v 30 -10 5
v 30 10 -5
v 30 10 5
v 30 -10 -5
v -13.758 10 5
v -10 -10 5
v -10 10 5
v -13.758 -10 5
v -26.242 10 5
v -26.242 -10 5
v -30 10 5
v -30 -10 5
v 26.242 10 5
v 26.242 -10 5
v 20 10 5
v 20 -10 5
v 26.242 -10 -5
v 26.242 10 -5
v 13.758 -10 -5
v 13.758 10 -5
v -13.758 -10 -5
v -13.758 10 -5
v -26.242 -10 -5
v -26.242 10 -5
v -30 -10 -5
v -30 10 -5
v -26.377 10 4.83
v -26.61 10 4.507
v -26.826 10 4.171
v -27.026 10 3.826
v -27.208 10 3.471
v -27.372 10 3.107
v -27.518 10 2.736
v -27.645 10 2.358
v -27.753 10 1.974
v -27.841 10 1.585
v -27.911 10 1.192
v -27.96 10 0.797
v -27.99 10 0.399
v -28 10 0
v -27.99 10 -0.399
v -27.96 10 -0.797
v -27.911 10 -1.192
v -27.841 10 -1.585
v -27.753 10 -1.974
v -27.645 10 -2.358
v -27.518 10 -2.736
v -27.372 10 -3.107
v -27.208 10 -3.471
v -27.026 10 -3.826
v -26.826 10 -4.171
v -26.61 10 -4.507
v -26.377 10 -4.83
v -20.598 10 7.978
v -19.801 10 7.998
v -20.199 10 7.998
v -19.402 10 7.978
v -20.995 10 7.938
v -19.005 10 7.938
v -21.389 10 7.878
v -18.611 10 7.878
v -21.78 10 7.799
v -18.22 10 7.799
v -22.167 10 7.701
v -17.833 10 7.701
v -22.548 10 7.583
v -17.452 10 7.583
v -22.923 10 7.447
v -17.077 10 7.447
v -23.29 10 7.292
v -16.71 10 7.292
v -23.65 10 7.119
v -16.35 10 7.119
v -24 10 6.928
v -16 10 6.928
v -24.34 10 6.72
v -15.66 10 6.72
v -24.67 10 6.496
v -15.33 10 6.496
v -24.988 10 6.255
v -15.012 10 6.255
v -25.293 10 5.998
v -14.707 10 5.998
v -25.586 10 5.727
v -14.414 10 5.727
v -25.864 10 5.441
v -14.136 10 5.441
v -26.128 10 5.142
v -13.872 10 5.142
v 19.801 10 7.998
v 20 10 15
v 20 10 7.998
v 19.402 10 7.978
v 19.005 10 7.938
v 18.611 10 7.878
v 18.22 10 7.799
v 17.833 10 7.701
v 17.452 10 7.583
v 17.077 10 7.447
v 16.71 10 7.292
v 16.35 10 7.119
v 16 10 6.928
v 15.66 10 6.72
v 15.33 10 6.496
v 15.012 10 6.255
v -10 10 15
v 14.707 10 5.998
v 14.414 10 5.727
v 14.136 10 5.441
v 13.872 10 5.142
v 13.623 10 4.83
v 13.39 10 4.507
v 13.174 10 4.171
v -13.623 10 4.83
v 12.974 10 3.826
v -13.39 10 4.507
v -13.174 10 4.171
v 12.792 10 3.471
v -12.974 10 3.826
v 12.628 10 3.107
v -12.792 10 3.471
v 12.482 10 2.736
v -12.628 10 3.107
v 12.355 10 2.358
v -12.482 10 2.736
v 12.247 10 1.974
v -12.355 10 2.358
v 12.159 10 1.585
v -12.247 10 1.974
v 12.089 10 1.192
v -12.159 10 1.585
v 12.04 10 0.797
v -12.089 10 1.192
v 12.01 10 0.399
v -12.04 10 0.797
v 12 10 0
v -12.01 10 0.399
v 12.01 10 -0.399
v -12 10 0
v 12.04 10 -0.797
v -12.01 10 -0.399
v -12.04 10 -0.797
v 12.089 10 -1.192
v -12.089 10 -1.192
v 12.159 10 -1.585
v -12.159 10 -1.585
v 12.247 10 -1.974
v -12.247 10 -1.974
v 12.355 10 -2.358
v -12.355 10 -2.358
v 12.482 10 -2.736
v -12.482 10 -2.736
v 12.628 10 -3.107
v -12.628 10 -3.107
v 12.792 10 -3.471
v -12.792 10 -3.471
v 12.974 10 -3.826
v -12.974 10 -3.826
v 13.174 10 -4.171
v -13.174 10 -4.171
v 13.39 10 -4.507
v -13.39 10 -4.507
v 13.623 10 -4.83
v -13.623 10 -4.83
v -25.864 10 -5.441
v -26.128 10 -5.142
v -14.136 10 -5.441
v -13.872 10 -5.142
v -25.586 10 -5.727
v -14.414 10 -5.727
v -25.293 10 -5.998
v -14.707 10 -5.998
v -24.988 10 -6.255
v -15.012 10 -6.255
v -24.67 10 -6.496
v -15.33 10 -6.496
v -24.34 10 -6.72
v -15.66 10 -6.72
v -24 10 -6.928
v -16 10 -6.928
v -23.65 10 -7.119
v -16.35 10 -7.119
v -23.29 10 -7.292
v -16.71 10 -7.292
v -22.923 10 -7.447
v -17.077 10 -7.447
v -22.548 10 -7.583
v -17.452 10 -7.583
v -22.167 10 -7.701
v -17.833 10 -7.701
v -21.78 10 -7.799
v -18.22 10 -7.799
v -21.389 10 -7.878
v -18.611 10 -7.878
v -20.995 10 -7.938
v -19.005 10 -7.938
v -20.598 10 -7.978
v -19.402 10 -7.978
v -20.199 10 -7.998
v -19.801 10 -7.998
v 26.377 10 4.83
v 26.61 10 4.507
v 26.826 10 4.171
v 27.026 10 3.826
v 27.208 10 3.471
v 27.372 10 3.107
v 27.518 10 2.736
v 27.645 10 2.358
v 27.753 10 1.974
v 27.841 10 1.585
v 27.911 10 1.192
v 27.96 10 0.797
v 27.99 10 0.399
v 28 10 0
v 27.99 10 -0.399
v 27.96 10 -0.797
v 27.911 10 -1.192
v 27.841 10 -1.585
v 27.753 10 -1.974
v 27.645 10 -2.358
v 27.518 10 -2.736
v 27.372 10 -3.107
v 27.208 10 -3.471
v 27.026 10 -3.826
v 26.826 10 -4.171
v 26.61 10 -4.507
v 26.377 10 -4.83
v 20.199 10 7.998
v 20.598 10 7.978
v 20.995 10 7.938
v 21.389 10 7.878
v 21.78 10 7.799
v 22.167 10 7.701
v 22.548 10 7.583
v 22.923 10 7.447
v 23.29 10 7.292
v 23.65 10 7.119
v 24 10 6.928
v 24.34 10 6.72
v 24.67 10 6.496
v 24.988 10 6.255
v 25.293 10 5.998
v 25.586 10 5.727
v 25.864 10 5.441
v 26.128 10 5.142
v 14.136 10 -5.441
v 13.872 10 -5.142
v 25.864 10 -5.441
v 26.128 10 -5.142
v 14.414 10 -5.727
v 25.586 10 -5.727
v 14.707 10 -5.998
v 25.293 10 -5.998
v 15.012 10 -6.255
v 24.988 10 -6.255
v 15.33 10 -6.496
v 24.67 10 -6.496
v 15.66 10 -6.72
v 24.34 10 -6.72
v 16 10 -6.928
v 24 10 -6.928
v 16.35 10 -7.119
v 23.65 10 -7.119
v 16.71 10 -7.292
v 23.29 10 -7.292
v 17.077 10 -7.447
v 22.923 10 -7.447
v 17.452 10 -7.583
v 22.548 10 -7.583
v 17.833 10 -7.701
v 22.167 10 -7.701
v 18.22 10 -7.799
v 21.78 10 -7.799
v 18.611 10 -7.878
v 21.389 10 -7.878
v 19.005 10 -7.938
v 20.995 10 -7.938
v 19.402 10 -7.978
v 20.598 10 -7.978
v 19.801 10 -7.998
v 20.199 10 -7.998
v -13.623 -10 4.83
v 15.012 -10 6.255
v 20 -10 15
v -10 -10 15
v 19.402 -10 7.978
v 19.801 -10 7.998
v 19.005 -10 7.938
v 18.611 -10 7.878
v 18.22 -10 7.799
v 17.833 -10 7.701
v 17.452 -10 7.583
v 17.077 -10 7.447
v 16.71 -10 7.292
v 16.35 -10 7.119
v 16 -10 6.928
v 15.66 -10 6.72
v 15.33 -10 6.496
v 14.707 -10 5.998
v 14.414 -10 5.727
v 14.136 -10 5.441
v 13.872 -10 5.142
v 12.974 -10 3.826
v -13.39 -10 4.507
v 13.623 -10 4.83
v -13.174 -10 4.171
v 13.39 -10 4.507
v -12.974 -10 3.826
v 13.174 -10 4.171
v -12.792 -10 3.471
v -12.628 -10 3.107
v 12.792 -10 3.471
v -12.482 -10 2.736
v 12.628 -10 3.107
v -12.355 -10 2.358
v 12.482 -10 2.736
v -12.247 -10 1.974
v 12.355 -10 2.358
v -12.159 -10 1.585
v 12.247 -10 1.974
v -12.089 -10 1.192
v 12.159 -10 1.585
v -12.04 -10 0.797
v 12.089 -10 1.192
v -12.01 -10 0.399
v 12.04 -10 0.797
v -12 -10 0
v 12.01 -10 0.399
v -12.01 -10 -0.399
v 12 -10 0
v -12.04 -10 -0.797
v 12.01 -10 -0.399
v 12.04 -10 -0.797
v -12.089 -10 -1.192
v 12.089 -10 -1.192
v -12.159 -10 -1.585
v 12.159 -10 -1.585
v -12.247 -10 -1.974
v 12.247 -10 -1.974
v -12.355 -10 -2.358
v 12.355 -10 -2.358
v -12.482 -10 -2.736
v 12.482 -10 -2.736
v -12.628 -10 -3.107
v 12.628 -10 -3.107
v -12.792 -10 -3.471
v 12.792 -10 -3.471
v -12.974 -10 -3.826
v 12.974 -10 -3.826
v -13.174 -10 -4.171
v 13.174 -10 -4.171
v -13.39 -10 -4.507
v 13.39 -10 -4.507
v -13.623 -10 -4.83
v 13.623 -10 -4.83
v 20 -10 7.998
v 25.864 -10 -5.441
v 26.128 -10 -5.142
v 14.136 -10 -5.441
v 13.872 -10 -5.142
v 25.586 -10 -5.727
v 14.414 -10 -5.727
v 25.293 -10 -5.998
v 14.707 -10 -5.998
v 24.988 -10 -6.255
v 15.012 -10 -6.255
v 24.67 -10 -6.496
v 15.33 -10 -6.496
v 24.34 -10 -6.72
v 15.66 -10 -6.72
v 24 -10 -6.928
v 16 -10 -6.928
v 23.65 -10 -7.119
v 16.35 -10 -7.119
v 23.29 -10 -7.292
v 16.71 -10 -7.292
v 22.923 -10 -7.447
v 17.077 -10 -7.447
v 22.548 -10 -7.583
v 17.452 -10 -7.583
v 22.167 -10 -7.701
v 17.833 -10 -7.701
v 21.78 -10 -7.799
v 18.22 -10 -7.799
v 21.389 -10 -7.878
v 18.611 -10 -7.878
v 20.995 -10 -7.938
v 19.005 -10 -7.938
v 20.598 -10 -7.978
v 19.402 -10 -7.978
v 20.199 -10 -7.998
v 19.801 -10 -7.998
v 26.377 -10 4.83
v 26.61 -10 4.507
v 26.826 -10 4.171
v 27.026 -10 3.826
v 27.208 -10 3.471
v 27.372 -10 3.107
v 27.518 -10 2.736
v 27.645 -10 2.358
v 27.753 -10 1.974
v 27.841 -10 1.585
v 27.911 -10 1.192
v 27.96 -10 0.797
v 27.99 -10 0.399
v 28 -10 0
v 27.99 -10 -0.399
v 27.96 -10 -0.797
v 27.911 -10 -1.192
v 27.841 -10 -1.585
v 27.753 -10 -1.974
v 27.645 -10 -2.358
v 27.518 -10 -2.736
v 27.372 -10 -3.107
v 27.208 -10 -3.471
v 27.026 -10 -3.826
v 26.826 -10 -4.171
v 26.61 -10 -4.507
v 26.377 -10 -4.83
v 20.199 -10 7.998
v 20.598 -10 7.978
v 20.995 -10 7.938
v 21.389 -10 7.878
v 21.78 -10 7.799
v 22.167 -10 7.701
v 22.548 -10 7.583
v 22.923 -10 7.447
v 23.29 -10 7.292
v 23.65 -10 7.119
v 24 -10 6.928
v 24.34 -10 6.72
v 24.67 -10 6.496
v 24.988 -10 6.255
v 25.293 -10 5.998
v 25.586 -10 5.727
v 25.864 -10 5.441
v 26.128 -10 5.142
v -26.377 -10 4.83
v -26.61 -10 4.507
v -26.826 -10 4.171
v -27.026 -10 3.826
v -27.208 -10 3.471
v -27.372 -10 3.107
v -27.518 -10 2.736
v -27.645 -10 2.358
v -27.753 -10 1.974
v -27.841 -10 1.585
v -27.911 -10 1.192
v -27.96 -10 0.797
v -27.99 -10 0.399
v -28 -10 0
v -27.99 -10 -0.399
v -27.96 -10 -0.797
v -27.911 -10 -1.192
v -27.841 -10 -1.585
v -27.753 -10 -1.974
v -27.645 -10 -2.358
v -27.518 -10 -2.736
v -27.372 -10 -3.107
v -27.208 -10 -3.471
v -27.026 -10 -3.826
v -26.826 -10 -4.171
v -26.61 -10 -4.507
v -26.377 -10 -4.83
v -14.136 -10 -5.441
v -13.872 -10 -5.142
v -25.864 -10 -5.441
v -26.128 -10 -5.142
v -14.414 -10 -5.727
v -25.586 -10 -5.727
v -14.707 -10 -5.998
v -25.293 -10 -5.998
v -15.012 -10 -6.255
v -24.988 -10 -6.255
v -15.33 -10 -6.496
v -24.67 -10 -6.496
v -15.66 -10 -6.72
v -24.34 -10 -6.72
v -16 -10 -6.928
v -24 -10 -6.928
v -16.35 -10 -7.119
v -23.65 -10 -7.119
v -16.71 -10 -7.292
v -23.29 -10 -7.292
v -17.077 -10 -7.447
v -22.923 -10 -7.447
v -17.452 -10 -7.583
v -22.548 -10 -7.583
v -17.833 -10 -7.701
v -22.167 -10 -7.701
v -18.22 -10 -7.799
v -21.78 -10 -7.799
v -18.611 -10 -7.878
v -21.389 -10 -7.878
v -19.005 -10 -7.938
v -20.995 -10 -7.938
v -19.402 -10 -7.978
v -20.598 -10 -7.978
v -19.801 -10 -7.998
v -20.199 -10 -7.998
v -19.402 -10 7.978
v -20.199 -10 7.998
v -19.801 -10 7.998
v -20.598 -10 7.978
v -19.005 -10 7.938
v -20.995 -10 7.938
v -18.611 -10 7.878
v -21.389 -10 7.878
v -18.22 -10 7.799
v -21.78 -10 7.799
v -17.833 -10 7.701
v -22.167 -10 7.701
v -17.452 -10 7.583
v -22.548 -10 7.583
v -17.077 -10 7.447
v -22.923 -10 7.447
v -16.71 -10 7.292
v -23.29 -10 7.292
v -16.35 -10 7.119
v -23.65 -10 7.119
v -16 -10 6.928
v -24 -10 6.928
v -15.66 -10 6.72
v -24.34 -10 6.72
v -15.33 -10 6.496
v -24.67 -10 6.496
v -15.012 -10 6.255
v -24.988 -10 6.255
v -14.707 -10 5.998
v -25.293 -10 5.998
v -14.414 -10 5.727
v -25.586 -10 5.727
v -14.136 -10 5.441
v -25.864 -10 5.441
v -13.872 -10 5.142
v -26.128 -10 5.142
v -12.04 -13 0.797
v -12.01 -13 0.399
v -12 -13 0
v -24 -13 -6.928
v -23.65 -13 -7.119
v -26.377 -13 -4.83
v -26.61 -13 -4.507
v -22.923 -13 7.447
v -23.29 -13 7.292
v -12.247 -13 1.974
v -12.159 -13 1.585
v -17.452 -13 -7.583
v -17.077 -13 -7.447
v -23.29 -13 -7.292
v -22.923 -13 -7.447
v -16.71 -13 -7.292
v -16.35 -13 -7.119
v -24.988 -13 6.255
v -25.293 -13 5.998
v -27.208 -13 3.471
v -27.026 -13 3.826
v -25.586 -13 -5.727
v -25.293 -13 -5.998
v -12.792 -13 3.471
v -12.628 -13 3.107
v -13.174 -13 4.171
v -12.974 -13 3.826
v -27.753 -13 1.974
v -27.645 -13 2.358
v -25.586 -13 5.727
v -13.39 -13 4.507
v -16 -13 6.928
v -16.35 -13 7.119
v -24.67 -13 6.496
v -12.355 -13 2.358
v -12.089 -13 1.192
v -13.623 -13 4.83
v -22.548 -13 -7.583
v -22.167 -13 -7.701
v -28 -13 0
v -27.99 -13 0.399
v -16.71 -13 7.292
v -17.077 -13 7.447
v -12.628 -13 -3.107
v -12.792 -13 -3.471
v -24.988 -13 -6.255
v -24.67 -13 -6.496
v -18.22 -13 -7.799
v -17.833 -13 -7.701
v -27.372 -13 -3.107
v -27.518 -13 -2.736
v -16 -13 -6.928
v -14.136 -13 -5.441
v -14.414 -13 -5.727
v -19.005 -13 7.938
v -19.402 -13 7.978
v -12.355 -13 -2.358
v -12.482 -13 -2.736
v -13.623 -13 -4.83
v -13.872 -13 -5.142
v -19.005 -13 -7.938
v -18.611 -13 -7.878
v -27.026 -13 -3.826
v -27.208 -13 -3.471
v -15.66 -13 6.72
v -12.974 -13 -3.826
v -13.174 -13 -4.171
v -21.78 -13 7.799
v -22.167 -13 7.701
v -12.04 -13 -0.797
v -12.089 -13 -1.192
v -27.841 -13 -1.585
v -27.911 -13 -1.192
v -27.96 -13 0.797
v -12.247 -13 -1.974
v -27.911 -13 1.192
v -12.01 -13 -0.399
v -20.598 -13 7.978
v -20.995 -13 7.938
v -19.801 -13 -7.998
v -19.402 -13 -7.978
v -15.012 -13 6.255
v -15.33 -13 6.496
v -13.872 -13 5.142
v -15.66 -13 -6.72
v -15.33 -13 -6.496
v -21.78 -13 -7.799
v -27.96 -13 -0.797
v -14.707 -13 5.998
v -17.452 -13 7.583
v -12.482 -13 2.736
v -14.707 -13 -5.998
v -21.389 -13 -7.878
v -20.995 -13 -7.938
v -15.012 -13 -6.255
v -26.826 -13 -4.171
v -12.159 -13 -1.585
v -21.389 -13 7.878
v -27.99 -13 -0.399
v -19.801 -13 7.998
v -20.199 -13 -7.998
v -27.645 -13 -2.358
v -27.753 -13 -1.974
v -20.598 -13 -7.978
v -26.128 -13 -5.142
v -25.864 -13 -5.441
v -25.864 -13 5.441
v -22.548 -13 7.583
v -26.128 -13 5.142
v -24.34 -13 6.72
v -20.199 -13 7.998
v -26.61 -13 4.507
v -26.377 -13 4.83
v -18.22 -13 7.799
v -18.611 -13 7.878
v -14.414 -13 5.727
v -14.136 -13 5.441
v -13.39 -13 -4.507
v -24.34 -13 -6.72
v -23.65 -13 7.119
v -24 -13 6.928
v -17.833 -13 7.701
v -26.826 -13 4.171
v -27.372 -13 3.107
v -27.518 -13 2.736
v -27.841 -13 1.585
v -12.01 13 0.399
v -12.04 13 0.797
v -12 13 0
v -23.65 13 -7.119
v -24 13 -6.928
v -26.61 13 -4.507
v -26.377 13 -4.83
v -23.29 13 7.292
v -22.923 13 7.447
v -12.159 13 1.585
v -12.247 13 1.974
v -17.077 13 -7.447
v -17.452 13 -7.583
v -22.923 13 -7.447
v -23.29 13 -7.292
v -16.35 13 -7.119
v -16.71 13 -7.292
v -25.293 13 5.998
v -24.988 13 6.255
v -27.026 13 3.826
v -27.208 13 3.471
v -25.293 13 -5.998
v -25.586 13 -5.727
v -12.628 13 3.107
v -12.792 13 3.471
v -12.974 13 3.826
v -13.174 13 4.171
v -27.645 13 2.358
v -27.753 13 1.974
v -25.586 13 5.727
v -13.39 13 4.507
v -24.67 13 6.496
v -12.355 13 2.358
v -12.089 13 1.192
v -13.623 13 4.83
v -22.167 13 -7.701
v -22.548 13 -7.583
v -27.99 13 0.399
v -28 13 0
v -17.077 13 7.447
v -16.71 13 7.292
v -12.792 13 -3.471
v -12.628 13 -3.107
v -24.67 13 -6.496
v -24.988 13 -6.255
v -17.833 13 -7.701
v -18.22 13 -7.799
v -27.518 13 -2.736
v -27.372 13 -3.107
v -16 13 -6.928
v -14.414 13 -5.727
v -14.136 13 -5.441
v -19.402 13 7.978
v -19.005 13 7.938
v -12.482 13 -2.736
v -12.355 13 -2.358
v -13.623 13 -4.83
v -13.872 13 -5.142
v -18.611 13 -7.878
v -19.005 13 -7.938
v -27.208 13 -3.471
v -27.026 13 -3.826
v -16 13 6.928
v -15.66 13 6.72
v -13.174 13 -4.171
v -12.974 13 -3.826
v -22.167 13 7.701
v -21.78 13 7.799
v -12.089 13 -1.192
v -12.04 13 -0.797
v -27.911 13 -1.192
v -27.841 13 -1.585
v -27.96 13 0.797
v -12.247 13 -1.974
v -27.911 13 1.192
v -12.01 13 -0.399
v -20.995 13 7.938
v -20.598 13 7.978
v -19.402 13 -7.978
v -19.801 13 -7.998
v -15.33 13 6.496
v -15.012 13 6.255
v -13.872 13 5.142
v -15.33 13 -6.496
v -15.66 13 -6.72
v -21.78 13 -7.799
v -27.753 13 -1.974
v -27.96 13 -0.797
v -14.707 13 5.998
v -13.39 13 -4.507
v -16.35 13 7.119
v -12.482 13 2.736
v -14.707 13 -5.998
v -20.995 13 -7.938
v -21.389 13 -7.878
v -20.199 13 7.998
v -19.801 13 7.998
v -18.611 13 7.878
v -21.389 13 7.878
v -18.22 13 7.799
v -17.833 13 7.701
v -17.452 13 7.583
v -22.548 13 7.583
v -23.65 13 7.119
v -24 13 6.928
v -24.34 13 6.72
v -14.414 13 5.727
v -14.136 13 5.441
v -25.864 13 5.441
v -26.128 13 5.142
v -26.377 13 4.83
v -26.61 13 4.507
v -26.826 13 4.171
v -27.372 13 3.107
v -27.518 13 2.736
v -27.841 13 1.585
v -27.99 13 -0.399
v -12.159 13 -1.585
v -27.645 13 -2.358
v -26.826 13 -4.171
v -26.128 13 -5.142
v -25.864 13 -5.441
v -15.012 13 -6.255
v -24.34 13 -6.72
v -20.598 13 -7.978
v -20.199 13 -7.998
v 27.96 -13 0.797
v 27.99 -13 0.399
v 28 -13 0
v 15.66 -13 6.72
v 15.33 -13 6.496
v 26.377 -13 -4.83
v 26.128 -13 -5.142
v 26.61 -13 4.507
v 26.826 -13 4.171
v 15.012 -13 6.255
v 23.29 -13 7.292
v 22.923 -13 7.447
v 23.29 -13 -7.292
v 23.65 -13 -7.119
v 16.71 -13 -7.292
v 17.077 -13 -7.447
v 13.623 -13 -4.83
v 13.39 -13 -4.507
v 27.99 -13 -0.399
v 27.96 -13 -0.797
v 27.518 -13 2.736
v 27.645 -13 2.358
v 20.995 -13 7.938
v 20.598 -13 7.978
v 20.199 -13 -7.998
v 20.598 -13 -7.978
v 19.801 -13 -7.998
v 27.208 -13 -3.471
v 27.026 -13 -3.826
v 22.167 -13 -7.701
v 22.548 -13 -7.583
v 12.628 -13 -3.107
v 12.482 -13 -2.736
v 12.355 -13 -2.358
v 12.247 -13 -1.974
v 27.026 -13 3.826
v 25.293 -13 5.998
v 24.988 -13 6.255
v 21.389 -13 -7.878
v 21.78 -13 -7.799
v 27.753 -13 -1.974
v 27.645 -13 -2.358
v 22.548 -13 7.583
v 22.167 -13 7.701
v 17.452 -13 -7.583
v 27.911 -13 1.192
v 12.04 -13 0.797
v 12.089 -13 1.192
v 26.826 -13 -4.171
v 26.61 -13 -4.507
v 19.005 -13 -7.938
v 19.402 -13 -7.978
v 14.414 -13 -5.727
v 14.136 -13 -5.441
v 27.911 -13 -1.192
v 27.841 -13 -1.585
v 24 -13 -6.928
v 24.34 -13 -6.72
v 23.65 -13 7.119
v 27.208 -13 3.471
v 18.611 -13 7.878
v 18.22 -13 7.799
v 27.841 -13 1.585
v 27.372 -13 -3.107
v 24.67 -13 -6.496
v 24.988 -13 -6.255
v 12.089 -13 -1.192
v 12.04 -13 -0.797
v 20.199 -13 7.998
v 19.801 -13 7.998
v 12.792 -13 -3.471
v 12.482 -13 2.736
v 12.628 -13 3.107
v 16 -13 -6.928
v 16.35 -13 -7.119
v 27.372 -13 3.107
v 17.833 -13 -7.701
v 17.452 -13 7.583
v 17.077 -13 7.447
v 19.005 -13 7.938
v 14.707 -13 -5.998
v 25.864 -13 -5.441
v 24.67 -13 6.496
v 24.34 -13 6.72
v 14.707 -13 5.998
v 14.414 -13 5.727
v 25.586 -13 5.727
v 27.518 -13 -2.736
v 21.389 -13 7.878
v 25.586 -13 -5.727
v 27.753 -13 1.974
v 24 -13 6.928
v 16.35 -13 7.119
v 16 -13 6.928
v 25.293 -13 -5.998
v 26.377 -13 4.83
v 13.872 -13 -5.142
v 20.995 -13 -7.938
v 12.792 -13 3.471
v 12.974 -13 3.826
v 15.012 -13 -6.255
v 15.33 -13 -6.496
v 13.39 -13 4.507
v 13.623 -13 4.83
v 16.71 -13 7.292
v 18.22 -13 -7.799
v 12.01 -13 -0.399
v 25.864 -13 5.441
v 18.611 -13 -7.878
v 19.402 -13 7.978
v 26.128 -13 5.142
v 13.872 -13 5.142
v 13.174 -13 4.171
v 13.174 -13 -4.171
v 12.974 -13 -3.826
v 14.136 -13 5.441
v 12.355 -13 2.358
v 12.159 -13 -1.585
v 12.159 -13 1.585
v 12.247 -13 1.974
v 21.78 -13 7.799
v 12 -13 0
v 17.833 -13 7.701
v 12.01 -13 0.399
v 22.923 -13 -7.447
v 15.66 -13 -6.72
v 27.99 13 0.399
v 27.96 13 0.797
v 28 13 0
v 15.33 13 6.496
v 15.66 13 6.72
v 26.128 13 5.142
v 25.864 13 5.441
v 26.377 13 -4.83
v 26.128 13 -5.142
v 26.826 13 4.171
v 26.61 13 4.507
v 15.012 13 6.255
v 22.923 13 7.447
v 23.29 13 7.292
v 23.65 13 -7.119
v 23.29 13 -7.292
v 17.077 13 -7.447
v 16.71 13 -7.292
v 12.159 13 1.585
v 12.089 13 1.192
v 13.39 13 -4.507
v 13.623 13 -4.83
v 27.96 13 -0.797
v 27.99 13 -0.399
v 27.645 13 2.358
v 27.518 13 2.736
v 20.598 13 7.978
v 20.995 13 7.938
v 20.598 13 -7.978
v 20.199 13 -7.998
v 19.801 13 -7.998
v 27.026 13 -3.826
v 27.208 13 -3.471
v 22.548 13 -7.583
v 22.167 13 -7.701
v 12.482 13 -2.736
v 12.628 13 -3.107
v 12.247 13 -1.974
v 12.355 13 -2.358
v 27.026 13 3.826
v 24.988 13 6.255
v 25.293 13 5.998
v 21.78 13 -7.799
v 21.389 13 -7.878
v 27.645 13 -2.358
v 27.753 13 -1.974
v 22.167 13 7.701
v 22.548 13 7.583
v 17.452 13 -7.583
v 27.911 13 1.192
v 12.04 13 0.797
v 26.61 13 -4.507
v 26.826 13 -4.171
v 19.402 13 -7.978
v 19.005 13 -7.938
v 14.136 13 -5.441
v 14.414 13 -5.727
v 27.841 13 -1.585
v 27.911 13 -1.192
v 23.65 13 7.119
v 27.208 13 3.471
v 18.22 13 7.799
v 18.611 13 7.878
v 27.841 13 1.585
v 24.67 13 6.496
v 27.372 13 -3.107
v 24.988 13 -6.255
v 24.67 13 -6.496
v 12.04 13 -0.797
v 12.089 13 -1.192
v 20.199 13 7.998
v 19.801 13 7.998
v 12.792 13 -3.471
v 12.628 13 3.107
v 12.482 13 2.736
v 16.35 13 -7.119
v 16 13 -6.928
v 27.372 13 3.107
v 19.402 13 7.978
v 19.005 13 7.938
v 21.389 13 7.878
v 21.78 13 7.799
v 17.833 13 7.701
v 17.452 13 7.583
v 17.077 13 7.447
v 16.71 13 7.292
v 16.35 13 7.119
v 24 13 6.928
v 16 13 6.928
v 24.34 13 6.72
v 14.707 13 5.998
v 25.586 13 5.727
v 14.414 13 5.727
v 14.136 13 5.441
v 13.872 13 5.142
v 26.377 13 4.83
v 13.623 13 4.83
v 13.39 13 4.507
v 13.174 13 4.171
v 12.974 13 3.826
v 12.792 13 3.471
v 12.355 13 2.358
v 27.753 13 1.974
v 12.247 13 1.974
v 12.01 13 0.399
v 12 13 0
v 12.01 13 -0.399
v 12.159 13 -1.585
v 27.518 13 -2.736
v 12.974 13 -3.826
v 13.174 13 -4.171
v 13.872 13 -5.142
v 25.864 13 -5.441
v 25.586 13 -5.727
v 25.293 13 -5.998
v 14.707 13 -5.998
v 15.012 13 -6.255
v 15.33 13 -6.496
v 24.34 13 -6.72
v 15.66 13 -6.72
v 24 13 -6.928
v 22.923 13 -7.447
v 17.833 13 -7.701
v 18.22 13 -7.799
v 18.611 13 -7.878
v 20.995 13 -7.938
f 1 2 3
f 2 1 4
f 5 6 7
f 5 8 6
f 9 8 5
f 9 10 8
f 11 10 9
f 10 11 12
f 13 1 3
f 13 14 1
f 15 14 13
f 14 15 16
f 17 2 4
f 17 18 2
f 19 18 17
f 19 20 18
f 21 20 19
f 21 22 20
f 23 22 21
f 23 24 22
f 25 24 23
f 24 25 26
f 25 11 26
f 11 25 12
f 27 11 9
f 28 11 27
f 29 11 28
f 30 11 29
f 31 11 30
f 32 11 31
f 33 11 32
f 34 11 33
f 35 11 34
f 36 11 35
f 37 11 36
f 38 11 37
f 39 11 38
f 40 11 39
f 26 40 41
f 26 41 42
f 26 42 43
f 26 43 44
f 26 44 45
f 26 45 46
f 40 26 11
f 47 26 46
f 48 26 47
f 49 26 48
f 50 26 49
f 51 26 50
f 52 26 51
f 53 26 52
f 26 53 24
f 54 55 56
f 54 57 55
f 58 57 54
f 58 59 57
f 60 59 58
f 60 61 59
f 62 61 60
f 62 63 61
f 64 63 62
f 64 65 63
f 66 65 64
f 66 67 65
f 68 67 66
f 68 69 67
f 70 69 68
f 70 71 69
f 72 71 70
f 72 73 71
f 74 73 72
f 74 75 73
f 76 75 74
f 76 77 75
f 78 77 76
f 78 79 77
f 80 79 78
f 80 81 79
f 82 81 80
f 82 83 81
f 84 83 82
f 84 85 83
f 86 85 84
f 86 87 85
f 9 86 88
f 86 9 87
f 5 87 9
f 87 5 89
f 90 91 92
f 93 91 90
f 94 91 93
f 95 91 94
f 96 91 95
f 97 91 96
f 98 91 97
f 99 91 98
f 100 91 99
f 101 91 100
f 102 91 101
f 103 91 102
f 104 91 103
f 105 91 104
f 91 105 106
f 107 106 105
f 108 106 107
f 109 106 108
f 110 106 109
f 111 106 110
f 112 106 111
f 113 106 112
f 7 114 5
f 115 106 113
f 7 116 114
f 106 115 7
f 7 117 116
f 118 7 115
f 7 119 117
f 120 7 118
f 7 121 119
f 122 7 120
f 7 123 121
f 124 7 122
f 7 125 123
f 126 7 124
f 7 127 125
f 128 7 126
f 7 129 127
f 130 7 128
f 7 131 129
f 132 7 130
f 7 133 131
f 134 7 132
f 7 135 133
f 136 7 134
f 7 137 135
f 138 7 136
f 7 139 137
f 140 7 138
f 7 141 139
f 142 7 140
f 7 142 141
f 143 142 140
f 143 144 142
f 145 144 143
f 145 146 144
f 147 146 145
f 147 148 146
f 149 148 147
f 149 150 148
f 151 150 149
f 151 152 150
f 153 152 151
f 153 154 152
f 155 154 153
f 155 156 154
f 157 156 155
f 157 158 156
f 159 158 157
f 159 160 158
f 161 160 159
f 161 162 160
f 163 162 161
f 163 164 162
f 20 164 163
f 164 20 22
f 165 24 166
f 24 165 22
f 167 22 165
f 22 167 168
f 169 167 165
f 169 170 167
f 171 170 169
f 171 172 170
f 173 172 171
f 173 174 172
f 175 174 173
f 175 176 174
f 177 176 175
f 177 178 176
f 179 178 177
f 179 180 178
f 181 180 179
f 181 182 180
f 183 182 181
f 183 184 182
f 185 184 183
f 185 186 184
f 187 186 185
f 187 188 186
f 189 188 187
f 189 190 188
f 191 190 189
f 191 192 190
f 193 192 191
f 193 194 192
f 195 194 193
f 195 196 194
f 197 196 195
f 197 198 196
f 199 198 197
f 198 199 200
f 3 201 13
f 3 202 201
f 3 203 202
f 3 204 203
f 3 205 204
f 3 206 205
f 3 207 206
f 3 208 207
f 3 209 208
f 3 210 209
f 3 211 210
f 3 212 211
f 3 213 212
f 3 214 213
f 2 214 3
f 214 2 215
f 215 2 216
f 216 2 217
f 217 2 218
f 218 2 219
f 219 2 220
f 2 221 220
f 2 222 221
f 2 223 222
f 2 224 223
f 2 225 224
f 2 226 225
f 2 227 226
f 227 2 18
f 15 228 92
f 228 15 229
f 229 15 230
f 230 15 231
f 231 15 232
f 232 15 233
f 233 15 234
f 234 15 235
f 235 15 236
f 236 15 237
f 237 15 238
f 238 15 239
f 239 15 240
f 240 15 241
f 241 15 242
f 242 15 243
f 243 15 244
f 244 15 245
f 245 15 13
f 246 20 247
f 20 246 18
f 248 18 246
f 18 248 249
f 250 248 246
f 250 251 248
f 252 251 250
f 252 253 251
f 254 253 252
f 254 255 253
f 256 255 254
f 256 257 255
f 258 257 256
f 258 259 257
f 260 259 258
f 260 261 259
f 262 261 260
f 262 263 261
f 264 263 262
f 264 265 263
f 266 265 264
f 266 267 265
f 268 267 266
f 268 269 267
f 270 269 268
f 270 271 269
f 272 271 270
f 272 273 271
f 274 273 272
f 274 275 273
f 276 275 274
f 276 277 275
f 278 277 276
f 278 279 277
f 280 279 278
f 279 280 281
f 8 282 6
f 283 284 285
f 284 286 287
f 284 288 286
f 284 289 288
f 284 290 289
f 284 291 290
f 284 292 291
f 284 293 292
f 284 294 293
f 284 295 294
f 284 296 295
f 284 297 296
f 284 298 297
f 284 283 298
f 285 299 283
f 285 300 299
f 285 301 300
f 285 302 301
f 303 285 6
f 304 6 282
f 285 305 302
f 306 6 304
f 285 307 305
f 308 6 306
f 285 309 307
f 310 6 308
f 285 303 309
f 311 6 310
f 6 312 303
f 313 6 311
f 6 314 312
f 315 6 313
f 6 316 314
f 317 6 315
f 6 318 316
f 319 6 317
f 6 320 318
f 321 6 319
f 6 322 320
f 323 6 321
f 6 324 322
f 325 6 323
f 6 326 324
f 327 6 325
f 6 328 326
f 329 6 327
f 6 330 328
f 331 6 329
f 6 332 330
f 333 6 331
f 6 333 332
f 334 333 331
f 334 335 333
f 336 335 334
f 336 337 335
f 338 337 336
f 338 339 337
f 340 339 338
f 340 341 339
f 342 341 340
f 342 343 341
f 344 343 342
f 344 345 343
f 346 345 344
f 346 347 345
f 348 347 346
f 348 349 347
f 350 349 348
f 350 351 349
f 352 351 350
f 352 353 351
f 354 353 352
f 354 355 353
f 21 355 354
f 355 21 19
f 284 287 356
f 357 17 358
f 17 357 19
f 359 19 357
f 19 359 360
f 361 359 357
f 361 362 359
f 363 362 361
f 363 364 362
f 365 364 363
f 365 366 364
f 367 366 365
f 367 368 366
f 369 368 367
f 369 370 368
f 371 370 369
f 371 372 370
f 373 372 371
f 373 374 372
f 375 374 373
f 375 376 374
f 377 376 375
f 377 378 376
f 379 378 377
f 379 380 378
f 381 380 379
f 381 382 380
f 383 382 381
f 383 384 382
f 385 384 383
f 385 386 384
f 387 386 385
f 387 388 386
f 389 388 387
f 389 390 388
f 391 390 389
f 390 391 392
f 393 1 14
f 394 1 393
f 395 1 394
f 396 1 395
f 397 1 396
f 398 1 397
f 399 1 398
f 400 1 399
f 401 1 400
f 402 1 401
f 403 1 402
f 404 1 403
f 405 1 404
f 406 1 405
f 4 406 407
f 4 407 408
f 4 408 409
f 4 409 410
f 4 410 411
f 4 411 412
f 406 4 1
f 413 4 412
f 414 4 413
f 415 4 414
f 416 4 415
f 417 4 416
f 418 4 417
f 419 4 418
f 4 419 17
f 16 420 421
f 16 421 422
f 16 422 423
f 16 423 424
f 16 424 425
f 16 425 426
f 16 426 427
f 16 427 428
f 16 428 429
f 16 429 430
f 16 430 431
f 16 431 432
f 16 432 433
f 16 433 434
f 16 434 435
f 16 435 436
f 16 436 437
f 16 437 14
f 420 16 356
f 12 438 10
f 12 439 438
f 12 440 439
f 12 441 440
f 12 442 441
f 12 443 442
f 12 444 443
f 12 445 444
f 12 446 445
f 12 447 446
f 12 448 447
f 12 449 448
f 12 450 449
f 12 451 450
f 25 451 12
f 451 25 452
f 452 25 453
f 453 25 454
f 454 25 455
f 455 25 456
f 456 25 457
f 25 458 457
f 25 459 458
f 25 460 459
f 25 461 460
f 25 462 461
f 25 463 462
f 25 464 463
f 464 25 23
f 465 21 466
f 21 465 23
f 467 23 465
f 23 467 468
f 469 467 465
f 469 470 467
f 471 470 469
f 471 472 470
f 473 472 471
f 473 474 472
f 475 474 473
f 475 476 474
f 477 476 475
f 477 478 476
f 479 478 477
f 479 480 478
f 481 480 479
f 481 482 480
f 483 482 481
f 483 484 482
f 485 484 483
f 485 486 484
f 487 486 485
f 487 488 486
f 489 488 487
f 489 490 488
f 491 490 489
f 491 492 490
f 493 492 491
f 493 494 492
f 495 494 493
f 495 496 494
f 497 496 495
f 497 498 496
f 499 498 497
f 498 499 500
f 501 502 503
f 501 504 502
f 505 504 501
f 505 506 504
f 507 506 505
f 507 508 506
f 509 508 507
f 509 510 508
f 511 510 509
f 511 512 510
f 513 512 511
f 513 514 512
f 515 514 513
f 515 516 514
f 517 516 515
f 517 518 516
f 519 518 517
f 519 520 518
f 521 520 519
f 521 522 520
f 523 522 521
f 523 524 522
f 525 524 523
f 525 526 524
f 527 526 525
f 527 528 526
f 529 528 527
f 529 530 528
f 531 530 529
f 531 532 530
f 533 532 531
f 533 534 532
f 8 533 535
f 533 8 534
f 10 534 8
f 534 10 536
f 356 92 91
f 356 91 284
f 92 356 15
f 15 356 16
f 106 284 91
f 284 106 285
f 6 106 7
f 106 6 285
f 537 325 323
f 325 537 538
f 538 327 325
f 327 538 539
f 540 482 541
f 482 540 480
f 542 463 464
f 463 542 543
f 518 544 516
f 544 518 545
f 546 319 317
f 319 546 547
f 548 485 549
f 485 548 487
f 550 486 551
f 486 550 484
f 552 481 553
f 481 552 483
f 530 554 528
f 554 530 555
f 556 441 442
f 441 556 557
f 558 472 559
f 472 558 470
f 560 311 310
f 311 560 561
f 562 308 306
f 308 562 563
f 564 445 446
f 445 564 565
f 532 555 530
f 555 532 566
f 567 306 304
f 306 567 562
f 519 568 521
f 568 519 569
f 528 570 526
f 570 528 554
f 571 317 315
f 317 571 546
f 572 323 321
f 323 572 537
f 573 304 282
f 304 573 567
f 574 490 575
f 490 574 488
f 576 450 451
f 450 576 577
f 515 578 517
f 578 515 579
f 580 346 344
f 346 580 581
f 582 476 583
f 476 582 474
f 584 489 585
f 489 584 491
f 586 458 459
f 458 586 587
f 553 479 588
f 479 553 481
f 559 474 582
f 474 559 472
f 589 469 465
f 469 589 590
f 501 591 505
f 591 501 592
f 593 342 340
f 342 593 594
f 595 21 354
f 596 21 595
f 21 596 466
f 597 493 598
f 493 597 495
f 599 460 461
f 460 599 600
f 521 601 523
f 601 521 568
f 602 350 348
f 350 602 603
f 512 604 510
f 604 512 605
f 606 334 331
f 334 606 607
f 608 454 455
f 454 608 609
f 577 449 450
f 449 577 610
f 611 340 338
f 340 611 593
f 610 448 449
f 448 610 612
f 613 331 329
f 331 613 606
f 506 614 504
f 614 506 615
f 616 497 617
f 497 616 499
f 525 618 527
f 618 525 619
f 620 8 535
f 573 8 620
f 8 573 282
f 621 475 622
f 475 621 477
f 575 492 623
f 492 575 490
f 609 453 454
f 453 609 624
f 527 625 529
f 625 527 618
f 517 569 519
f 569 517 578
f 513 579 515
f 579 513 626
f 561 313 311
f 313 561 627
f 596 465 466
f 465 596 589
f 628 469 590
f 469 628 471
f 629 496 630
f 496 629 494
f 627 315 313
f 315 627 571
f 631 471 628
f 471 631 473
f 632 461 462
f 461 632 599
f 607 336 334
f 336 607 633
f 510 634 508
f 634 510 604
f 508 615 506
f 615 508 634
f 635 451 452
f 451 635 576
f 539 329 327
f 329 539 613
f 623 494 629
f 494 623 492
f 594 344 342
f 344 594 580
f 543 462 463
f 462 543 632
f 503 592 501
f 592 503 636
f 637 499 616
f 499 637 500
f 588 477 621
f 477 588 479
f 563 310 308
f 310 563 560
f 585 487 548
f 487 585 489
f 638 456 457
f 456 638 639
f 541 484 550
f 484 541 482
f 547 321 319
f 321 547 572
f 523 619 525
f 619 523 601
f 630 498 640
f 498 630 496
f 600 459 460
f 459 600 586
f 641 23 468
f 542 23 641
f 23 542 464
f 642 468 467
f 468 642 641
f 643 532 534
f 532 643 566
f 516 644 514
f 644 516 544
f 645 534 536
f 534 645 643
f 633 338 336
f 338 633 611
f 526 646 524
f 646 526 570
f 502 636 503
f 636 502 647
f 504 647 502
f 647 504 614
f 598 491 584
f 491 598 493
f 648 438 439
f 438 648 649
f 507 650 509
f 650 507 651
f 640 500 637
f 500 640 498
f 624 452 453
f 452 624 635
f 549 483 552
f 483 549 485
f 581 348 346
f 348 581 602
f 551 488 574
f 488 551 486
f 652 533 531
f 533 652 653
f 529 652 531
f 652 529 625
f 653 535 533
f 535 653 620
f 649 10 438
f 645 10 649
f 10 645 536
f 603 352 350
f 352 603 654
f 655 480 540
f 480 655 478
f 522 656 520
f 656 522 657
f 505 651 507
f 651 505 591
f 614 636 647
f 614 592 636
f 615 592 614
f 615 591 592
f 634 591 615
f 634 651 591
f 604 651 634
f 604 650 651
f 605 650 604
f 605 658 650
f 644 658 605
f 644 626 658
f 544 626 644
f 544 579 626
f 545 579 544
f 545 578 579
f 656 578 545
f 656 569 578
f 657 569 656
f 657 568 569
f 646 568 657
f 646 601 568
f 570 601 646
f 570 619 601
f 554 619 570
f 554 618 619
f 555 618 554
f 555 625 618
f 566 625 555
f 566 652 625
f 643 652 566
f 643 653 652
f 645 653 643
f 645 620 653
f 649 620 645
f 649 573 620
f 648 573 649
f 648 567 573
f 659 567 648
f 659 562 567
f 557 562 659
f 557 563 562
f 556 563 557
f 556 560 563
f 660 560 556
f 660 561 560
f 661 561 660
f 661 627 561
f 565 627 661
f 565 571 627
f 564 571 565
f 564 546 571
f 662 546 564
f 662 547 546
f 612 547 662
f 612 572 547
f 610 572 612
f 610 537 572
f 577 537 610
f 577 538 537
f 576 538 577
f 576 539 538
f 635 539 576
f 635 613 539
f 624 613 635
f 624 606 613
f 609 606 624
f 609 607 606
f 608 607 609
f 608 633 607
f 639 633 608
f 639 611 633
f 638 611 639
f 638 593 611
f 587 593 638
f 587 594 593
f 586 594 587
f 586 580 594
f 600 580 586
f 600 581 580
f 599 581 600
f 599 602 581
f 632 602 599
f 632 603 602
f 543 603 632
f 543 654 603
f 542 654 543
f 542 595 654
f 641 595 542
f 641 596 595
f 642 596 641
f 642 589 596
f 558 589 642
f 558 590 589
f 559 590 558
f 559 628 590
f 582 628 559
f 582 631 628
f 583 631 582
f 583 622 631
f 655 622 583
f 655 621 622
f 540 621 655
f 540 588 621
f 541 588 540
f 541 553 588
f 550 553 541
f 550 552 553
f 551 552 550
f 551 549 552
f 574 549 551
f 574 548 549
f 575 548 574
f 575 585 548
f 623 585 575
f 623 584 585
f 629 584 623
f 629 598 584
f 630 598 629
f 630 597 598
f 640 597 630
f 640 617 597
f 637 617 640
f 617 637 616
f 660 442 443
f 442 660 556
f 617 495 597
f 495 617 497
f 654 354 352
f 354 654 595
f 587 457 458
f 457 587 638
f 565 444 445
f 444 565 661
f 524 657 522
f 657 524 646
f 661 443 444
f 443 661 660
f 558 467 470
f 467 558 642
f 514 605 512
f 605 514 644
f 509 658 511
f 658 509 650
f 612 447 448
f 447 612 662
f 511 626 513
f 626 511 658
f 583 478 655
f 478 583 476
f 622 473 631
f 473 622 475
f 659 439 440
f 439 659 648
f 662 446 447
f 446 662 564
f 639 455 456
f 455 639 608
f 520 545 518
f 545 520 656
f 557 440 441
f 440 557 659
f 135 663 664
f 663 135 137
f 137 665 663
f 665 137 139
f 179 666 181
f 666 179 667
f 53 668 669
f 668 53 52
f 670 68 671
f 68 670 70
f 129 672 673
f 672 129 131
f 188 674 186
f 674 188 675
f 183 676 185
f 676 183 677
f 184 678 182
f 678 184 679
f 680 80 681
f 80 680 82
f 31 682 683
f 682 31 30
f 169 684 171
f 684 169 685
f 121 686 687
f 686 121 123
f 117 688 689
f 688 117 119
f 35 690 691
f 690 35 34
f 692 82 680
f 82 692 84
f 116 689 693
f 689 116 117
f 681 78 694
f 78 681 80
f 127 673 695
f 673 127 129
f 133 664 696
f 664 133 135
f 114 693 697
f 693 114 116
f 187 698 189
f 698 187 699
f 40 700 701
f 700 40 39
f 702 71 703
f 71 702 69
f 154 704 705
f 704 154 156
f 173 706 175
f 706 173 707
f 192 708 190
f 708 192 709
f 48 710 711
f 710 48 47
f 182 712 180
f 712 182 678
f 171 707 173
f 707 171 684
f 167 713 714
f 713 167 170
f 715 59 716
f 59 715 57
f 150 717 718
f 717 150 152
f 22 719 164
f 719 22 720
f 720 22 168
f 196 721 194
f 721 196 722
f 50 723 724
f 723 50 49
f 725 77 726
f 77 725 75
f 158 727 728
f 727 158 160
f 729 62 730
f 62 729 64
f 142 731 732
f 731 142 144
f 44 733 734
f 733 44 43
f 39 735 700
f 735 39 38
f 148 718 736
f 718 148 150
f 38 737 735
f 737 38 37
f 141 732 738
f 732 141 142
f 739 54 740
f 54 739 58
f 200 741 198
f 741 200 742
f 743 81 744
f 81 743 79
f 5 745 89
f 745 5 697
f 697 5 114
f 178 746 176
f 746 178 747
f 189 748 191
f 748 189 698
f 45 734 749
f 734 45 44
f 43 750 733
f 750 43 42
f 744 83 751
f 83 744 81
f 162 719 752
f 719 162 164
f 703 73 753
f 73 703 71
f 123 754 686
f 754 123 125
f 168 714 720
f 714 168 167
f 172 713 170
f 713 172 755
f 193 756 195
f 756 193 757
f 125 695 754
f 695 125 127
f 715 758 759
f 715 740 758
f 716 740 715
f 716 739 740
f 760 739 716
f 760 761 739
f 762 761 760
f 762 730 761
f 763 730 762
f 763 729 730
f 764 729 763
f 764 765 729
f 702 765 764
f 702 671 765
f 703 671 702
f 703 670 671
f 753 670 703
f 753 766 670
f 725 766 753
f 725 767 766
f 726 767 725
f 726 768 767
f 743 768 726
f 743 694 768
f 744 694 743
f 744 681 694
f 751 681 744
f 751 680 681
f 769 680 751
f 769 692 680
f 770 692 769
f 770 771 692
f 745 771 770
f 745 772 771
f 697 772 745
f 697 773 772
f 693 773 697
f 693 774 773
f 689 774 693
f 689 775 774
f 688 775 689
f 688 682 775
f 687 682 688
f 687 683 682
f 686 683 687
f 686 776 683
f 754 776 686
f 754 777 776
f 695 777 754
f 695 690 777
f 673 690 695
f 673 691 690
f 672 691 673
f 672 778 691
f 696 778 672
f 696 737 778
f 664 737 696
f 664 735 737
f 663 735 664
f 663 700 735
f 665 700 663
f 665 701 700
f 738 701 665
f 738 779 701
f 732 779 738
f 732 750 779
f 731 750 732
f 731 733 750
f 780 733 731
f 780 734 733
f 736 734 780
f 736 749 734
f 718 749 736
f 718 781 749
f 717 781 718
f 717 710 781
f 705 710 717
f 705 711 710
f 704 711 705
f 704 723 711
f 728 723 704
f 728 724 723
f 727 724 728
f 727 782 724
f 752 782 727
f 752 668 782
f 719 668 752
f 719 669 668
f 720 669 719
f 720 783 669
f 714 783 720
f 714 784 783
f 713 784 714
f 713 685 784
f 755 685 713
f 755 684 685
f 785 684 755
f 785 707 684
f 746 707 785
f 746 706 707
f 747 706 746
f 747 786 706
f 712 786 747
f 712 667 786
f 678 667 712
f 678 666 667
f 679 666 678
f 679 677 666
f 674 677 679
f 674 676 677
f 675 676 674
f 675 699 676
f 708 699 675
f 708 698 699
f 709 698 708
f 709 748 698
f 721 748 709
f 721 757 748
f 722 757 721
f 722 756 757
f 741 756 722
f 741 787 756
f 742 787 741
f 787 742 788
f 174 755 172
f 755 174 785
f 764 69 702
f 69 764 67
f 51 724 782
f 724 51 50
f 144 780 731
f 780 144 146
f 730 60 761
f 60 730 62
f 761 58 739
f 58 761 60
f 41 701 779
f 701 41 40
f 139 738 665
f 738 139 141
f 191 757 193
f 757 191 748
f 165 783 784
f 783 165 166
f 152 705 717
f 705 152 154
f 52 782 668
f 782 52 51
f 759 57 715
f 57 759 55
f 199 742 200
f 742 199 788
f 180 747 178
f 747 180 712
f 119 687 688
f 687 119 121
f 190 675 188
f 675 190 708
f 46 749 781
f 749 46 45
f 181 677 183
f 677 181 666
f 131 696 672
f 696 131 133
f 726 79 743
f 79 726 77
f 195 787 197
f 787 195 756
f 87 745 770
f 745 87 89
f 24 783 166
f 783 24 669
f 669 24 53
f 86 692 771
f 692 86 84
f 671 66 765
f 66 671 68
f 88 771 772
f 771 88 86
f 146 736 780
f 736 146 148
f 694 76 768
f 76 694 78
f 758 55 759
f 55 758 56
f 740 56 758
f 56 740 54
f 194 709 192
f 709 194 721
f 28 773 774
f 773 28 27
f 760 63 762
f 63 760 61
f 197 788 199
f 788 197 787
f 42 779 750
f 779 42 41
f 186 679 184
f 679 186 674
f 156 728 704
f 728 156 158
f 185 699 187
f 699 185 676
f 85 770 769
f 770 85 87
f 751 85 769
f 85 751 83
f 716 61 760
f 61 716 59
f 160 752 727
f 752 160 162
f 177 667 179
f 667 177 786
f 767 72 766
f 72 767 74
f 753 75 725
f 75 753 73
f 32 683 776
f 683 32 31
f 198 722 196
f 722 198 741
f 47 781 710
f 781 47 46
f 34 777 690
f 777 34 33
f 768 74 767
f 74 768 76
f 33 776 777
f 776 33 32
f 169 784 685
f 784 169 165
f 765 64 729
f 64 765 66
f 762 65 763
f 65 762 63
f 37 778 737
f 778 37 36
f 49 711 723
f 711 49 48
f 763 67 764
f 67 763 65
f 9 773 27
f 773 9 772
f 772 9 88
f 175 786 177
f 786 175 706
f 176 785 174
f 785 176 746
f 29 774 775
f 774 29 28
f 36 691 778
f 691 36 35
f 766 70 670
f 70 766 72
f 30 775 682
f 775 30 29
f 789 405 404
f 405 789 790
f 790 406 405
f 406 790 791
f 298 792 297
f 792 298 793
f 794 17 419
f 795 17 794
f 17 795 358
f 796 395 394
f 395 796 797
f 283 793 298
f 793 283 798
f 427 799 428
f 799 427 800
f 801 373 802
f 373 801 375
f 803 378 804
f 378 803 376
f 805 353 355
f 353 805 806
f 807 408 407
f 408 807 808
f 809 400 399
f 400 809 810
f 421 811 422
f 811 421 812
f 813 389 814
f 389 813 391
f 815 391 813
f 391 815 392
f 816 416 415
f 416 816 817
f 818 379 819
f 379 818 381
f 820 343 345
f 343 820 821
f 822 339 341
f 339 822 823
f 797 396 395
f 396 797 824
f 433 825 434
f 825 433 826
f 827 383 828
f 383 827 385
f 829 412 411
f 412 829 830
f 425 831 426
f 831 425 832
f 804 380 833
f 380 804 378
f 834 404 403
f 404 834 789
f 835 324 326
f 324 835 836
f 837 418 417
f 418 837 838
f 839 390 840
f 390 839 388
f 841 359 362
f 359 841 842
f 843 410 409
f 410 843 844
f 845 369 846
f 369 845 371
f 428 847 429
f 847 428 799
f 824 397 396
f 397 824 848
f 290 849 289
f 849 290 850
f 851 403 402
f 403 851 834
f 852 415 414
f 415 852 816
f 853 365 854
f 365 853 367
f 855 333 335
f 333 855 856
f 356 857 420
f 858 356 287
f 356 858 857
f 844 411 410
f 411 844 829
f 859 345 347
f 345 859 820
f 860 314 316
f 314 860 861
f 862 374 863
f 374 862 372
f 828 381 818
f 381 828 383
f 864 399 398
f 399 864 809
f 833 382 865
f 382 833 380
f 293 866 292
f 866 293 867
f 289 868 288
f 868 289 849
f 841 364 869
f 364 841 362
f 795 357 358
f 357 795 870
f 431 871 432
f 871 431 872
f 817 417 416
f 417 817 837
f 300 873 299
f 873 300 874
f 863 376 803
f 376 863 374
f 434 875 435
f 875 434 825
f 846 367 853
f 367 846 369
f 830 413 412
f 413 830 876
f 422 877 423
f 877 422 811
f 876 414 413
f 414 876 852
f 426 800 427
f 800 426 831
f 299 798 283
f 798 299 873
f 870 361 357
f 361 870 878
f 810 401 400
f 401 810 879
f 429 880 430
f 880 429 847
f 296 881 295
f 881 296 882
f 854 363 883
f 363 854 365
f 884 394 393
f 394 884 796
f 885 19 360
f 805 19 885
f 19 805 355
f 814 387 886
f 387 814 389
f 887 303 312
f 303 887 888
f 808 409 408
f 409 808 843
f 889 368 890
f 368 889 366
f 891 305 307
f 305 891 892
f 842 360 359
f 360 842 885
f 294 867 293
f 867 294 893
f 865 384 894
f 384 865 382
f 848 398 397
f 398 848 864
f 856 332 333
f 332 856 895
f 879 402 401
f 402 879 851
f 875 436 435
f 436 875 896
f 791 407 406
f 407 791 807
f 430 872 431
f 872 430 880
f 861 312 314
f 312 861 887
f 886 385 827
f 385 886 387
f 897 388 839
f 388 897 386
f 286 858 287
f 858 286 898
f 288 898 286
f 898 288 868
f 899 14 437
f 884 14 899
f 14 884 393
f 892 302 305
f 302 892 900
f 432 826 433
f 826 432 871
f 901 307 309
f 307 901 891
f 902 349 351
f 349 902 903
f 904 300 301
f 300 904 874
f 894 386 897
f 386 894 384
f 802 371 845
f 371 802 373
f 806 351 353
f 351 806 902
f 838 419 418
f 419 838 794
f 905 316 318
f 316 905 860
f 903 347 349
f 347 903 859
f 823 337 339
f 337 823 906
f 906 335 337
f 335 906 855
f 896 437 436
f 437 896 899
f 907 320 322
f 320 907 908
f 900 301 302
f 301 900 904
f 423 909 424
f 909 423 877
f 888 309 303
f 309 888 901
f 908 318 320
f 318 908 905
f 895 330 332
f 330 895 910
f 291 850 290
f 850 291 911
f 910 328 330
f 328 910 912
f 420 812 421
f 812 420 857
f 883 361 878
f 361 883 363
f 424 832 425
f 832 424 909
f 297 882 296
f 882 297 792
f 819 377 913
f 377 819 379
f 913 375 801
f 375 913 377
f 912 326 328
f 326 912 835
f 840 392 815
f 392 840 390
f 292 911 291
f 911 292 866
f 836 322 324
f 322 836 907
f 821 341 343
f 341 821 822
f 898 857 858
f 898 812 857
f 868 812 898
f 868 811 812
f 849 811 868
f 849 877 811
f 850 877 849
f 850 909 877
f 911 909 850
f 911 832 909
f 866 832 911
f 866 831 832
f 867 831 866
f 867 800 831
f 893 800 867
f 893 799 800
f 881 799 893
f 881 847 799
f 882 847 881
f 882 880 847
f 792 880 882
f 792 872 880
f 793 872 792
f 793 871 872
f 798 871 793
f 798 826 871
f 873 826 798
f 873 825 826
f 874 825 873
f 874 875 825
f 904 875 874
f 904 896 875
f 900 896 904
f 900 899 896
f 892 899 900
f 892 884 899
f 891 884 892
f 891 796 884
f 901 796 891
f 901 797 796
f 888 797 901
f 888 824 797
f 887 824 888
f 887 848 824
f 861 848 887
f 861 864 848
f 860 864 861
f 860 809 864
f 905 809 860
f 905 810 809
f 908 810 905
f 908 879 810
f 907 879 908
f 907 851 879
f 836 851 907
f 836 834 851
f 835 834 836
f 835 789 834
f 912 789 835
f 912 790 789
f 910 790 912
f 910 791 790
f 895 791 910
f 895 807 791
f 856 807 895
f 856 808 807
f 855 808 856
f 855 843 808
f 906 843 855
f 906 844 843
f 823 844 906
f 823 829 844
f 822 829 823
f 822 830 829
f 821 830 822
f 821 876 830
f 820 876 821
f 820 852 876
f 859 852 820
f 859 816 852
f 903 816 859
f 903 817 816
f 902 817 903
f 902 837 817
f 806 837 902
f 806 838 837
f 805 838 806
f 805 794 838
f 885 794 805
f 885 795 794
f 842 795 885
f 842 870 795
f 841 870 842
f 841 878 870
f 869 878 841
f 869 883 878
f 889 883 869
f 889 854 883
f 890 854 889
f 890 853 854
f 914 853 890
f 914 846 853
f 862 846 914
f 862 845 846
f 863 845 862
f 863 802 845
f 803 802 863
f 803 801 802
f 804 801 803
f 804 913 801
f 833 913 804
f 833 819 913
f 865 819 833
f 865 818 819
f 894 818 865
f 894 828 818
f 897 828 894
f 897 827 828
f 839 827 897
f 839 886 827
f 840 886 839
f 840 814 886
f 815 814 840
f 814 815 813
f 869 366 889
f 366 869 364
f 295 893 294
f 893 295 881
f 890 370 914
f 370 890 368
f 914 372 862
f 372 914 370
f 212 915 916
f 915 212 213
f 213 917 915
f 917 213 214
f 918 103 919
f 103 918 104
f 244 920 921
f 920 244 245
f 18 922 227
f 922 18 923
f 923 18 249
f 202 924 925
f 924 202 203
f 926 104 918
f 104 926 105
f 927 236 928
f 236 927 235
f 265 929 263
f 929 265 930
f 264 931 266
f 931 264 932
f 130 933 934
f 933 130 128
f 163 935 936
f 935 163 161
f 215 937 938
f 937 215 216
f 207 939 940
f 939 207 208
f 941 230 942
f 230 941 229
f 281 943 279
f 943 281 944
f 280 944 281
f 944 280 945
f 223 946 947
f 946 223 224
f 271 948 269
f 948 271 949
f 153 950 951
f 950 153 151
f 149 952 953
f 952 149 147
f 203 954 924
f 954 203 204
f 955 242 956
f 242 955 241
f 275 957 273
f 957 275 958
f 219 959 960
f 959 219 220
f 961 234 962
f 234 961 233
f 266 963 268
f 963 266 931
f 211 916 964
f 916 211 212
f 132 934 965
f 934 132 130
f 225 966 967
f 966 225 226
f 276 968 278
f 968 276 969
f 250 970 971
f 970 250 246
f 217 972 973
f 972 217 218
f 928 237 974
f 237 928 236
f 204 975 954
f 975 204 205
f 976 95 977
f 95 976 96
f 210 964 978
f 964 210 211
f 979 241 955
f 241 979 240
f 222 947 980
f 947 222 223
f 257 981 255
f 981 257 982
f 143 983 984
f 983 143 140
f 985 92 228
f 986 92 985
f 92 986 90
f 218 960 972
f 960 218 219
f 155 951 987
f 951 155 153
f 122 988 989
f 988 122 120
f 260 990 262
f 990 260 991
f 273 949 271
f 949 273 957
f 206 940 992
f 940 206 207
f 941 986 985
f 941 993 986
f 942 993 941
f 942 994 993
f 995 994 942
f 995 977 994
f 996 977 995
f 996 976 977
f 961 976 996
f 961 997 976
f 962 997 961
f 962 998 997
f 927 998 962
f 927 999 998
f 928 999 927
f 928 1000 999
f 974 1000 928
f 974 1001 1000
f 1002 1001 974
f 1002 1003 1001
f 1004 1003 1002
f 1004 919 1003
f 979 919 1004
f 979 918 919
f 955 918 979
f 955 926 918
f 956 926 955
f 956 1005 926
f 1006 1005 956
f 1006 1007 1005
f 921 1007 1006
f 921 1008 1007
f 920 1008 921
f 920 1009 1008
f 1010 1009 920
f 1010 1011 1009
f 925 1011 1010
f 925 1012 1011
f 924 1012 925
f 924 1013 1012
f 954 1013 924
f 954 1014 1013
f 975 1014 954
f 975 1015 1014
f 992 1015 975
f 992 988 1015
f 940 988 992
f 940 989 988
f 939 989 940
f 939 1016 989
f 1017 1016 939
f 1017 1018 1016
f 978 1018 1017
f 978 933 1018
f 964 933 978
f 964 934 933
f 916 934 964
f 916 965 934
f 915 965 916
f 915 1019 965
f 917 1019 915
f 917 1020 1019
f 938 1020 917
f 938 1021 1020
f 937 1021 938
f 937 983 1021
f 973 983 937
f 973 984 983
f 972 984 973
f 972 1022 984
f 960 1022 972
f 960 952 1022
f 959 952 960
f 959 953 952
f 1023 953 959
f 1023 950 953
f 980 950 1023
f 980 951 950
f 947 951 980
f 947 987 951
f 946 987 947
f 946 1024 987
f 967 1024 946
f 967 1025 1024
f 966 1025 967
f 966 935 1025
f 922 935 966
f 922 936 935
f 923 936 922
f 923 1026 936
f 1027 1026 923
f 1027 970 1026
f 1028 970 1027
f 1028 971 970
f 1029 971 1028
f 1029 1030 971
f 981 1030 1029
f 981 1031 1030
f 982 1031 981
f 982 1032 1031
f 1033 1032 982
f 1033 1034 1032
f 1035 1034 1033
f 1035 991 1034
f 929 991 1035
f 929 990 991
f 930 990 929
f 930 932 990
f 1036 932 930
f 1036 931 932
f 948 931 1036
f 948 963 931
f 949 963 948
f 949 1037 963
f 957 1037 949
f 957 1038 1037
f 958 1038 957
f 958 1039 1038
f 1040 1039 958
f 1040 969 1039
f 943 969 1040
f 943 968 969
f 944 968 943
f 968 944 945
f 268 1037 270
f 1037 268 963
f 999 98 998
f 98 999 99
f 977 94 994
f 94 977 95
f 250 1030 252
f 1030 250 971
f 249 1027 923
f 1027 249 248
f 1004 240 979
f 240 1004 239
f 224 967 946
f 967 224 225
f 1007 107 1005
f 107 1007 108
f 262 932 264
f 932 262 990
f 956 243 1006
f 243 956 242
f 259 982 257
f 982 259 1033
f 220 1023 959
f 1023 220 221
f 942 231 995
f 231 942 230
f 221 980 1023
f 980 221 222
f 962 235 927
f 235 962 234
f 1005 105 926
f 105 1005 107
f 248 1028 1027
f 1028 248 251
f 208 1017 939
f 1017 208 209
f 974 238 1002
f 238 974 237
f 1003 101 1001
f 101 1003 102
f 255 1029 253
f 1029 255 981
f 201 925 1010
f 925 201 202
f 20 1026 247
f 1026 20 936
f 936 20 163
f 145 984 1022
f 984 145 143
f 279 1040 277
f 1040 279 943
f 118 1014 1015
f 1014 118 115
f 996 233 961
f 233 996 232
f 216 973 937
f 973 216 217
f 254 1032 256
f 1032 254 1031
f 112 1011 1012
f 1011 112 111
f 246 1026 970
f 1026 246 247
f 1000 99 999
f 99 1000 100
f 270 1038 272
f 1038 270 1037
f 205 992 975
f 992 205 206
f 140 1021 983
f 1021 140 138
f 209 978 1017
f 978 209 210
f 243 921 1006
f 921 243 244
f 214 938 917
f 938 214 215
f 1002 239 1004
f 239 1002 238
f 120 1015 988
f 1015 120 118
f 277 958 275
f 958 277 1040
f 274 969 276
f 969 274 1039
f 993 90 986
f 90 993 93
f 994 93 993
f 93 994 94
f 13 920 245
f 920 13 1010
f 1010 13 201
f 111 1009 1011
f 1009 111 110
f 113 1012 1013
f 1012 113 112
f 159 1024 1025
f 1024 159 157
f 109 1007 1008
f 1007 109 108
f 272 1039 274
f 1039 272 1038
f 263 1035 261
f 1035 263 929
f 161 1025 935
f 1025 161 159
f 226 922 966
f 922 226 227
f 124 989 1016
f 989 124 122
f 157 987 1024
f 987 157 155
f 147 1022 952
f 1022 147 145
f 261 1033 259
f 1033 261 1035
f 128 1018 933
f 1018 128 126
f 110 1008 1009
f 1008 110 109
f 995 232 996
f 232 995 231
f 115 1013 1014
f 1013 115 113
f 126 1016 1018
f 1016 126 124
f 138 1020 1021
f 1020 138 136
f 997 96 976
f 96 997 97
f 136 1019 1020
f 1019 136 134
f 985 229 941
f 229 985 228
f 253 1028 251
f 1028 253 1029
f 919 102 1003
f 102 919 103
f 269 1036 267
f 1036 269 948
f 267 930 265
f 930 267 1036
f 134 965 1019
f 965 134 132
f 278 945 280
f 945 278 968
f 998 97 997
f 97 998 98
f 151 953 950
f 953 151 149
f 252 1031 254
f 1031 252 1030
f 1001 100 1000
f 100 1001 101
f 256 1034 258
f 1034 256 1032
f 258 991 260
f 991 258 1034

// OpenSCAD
$fa = 1;
$fs = 0.4;

cube([60,20,10],center=true);
translate([5,0,10])
    cube([30,20,10],center=true);
translate([-20,-11.5,0])
    rotate([90,0,0])
    cylinder(h=3,r=8, center=true);
translate([-20,11.5,0])
    rotate([90,0,0])
    cylinder(h=3,r=8, center=true);
translate([20,-11.5,0])
    rotate([90,0,0])
    cylinder(h=3,r=8, center=true);
translate([20,11.5,0])
    rotate([90,0,0])
    cylinder(h=3,r=8, center=true);
